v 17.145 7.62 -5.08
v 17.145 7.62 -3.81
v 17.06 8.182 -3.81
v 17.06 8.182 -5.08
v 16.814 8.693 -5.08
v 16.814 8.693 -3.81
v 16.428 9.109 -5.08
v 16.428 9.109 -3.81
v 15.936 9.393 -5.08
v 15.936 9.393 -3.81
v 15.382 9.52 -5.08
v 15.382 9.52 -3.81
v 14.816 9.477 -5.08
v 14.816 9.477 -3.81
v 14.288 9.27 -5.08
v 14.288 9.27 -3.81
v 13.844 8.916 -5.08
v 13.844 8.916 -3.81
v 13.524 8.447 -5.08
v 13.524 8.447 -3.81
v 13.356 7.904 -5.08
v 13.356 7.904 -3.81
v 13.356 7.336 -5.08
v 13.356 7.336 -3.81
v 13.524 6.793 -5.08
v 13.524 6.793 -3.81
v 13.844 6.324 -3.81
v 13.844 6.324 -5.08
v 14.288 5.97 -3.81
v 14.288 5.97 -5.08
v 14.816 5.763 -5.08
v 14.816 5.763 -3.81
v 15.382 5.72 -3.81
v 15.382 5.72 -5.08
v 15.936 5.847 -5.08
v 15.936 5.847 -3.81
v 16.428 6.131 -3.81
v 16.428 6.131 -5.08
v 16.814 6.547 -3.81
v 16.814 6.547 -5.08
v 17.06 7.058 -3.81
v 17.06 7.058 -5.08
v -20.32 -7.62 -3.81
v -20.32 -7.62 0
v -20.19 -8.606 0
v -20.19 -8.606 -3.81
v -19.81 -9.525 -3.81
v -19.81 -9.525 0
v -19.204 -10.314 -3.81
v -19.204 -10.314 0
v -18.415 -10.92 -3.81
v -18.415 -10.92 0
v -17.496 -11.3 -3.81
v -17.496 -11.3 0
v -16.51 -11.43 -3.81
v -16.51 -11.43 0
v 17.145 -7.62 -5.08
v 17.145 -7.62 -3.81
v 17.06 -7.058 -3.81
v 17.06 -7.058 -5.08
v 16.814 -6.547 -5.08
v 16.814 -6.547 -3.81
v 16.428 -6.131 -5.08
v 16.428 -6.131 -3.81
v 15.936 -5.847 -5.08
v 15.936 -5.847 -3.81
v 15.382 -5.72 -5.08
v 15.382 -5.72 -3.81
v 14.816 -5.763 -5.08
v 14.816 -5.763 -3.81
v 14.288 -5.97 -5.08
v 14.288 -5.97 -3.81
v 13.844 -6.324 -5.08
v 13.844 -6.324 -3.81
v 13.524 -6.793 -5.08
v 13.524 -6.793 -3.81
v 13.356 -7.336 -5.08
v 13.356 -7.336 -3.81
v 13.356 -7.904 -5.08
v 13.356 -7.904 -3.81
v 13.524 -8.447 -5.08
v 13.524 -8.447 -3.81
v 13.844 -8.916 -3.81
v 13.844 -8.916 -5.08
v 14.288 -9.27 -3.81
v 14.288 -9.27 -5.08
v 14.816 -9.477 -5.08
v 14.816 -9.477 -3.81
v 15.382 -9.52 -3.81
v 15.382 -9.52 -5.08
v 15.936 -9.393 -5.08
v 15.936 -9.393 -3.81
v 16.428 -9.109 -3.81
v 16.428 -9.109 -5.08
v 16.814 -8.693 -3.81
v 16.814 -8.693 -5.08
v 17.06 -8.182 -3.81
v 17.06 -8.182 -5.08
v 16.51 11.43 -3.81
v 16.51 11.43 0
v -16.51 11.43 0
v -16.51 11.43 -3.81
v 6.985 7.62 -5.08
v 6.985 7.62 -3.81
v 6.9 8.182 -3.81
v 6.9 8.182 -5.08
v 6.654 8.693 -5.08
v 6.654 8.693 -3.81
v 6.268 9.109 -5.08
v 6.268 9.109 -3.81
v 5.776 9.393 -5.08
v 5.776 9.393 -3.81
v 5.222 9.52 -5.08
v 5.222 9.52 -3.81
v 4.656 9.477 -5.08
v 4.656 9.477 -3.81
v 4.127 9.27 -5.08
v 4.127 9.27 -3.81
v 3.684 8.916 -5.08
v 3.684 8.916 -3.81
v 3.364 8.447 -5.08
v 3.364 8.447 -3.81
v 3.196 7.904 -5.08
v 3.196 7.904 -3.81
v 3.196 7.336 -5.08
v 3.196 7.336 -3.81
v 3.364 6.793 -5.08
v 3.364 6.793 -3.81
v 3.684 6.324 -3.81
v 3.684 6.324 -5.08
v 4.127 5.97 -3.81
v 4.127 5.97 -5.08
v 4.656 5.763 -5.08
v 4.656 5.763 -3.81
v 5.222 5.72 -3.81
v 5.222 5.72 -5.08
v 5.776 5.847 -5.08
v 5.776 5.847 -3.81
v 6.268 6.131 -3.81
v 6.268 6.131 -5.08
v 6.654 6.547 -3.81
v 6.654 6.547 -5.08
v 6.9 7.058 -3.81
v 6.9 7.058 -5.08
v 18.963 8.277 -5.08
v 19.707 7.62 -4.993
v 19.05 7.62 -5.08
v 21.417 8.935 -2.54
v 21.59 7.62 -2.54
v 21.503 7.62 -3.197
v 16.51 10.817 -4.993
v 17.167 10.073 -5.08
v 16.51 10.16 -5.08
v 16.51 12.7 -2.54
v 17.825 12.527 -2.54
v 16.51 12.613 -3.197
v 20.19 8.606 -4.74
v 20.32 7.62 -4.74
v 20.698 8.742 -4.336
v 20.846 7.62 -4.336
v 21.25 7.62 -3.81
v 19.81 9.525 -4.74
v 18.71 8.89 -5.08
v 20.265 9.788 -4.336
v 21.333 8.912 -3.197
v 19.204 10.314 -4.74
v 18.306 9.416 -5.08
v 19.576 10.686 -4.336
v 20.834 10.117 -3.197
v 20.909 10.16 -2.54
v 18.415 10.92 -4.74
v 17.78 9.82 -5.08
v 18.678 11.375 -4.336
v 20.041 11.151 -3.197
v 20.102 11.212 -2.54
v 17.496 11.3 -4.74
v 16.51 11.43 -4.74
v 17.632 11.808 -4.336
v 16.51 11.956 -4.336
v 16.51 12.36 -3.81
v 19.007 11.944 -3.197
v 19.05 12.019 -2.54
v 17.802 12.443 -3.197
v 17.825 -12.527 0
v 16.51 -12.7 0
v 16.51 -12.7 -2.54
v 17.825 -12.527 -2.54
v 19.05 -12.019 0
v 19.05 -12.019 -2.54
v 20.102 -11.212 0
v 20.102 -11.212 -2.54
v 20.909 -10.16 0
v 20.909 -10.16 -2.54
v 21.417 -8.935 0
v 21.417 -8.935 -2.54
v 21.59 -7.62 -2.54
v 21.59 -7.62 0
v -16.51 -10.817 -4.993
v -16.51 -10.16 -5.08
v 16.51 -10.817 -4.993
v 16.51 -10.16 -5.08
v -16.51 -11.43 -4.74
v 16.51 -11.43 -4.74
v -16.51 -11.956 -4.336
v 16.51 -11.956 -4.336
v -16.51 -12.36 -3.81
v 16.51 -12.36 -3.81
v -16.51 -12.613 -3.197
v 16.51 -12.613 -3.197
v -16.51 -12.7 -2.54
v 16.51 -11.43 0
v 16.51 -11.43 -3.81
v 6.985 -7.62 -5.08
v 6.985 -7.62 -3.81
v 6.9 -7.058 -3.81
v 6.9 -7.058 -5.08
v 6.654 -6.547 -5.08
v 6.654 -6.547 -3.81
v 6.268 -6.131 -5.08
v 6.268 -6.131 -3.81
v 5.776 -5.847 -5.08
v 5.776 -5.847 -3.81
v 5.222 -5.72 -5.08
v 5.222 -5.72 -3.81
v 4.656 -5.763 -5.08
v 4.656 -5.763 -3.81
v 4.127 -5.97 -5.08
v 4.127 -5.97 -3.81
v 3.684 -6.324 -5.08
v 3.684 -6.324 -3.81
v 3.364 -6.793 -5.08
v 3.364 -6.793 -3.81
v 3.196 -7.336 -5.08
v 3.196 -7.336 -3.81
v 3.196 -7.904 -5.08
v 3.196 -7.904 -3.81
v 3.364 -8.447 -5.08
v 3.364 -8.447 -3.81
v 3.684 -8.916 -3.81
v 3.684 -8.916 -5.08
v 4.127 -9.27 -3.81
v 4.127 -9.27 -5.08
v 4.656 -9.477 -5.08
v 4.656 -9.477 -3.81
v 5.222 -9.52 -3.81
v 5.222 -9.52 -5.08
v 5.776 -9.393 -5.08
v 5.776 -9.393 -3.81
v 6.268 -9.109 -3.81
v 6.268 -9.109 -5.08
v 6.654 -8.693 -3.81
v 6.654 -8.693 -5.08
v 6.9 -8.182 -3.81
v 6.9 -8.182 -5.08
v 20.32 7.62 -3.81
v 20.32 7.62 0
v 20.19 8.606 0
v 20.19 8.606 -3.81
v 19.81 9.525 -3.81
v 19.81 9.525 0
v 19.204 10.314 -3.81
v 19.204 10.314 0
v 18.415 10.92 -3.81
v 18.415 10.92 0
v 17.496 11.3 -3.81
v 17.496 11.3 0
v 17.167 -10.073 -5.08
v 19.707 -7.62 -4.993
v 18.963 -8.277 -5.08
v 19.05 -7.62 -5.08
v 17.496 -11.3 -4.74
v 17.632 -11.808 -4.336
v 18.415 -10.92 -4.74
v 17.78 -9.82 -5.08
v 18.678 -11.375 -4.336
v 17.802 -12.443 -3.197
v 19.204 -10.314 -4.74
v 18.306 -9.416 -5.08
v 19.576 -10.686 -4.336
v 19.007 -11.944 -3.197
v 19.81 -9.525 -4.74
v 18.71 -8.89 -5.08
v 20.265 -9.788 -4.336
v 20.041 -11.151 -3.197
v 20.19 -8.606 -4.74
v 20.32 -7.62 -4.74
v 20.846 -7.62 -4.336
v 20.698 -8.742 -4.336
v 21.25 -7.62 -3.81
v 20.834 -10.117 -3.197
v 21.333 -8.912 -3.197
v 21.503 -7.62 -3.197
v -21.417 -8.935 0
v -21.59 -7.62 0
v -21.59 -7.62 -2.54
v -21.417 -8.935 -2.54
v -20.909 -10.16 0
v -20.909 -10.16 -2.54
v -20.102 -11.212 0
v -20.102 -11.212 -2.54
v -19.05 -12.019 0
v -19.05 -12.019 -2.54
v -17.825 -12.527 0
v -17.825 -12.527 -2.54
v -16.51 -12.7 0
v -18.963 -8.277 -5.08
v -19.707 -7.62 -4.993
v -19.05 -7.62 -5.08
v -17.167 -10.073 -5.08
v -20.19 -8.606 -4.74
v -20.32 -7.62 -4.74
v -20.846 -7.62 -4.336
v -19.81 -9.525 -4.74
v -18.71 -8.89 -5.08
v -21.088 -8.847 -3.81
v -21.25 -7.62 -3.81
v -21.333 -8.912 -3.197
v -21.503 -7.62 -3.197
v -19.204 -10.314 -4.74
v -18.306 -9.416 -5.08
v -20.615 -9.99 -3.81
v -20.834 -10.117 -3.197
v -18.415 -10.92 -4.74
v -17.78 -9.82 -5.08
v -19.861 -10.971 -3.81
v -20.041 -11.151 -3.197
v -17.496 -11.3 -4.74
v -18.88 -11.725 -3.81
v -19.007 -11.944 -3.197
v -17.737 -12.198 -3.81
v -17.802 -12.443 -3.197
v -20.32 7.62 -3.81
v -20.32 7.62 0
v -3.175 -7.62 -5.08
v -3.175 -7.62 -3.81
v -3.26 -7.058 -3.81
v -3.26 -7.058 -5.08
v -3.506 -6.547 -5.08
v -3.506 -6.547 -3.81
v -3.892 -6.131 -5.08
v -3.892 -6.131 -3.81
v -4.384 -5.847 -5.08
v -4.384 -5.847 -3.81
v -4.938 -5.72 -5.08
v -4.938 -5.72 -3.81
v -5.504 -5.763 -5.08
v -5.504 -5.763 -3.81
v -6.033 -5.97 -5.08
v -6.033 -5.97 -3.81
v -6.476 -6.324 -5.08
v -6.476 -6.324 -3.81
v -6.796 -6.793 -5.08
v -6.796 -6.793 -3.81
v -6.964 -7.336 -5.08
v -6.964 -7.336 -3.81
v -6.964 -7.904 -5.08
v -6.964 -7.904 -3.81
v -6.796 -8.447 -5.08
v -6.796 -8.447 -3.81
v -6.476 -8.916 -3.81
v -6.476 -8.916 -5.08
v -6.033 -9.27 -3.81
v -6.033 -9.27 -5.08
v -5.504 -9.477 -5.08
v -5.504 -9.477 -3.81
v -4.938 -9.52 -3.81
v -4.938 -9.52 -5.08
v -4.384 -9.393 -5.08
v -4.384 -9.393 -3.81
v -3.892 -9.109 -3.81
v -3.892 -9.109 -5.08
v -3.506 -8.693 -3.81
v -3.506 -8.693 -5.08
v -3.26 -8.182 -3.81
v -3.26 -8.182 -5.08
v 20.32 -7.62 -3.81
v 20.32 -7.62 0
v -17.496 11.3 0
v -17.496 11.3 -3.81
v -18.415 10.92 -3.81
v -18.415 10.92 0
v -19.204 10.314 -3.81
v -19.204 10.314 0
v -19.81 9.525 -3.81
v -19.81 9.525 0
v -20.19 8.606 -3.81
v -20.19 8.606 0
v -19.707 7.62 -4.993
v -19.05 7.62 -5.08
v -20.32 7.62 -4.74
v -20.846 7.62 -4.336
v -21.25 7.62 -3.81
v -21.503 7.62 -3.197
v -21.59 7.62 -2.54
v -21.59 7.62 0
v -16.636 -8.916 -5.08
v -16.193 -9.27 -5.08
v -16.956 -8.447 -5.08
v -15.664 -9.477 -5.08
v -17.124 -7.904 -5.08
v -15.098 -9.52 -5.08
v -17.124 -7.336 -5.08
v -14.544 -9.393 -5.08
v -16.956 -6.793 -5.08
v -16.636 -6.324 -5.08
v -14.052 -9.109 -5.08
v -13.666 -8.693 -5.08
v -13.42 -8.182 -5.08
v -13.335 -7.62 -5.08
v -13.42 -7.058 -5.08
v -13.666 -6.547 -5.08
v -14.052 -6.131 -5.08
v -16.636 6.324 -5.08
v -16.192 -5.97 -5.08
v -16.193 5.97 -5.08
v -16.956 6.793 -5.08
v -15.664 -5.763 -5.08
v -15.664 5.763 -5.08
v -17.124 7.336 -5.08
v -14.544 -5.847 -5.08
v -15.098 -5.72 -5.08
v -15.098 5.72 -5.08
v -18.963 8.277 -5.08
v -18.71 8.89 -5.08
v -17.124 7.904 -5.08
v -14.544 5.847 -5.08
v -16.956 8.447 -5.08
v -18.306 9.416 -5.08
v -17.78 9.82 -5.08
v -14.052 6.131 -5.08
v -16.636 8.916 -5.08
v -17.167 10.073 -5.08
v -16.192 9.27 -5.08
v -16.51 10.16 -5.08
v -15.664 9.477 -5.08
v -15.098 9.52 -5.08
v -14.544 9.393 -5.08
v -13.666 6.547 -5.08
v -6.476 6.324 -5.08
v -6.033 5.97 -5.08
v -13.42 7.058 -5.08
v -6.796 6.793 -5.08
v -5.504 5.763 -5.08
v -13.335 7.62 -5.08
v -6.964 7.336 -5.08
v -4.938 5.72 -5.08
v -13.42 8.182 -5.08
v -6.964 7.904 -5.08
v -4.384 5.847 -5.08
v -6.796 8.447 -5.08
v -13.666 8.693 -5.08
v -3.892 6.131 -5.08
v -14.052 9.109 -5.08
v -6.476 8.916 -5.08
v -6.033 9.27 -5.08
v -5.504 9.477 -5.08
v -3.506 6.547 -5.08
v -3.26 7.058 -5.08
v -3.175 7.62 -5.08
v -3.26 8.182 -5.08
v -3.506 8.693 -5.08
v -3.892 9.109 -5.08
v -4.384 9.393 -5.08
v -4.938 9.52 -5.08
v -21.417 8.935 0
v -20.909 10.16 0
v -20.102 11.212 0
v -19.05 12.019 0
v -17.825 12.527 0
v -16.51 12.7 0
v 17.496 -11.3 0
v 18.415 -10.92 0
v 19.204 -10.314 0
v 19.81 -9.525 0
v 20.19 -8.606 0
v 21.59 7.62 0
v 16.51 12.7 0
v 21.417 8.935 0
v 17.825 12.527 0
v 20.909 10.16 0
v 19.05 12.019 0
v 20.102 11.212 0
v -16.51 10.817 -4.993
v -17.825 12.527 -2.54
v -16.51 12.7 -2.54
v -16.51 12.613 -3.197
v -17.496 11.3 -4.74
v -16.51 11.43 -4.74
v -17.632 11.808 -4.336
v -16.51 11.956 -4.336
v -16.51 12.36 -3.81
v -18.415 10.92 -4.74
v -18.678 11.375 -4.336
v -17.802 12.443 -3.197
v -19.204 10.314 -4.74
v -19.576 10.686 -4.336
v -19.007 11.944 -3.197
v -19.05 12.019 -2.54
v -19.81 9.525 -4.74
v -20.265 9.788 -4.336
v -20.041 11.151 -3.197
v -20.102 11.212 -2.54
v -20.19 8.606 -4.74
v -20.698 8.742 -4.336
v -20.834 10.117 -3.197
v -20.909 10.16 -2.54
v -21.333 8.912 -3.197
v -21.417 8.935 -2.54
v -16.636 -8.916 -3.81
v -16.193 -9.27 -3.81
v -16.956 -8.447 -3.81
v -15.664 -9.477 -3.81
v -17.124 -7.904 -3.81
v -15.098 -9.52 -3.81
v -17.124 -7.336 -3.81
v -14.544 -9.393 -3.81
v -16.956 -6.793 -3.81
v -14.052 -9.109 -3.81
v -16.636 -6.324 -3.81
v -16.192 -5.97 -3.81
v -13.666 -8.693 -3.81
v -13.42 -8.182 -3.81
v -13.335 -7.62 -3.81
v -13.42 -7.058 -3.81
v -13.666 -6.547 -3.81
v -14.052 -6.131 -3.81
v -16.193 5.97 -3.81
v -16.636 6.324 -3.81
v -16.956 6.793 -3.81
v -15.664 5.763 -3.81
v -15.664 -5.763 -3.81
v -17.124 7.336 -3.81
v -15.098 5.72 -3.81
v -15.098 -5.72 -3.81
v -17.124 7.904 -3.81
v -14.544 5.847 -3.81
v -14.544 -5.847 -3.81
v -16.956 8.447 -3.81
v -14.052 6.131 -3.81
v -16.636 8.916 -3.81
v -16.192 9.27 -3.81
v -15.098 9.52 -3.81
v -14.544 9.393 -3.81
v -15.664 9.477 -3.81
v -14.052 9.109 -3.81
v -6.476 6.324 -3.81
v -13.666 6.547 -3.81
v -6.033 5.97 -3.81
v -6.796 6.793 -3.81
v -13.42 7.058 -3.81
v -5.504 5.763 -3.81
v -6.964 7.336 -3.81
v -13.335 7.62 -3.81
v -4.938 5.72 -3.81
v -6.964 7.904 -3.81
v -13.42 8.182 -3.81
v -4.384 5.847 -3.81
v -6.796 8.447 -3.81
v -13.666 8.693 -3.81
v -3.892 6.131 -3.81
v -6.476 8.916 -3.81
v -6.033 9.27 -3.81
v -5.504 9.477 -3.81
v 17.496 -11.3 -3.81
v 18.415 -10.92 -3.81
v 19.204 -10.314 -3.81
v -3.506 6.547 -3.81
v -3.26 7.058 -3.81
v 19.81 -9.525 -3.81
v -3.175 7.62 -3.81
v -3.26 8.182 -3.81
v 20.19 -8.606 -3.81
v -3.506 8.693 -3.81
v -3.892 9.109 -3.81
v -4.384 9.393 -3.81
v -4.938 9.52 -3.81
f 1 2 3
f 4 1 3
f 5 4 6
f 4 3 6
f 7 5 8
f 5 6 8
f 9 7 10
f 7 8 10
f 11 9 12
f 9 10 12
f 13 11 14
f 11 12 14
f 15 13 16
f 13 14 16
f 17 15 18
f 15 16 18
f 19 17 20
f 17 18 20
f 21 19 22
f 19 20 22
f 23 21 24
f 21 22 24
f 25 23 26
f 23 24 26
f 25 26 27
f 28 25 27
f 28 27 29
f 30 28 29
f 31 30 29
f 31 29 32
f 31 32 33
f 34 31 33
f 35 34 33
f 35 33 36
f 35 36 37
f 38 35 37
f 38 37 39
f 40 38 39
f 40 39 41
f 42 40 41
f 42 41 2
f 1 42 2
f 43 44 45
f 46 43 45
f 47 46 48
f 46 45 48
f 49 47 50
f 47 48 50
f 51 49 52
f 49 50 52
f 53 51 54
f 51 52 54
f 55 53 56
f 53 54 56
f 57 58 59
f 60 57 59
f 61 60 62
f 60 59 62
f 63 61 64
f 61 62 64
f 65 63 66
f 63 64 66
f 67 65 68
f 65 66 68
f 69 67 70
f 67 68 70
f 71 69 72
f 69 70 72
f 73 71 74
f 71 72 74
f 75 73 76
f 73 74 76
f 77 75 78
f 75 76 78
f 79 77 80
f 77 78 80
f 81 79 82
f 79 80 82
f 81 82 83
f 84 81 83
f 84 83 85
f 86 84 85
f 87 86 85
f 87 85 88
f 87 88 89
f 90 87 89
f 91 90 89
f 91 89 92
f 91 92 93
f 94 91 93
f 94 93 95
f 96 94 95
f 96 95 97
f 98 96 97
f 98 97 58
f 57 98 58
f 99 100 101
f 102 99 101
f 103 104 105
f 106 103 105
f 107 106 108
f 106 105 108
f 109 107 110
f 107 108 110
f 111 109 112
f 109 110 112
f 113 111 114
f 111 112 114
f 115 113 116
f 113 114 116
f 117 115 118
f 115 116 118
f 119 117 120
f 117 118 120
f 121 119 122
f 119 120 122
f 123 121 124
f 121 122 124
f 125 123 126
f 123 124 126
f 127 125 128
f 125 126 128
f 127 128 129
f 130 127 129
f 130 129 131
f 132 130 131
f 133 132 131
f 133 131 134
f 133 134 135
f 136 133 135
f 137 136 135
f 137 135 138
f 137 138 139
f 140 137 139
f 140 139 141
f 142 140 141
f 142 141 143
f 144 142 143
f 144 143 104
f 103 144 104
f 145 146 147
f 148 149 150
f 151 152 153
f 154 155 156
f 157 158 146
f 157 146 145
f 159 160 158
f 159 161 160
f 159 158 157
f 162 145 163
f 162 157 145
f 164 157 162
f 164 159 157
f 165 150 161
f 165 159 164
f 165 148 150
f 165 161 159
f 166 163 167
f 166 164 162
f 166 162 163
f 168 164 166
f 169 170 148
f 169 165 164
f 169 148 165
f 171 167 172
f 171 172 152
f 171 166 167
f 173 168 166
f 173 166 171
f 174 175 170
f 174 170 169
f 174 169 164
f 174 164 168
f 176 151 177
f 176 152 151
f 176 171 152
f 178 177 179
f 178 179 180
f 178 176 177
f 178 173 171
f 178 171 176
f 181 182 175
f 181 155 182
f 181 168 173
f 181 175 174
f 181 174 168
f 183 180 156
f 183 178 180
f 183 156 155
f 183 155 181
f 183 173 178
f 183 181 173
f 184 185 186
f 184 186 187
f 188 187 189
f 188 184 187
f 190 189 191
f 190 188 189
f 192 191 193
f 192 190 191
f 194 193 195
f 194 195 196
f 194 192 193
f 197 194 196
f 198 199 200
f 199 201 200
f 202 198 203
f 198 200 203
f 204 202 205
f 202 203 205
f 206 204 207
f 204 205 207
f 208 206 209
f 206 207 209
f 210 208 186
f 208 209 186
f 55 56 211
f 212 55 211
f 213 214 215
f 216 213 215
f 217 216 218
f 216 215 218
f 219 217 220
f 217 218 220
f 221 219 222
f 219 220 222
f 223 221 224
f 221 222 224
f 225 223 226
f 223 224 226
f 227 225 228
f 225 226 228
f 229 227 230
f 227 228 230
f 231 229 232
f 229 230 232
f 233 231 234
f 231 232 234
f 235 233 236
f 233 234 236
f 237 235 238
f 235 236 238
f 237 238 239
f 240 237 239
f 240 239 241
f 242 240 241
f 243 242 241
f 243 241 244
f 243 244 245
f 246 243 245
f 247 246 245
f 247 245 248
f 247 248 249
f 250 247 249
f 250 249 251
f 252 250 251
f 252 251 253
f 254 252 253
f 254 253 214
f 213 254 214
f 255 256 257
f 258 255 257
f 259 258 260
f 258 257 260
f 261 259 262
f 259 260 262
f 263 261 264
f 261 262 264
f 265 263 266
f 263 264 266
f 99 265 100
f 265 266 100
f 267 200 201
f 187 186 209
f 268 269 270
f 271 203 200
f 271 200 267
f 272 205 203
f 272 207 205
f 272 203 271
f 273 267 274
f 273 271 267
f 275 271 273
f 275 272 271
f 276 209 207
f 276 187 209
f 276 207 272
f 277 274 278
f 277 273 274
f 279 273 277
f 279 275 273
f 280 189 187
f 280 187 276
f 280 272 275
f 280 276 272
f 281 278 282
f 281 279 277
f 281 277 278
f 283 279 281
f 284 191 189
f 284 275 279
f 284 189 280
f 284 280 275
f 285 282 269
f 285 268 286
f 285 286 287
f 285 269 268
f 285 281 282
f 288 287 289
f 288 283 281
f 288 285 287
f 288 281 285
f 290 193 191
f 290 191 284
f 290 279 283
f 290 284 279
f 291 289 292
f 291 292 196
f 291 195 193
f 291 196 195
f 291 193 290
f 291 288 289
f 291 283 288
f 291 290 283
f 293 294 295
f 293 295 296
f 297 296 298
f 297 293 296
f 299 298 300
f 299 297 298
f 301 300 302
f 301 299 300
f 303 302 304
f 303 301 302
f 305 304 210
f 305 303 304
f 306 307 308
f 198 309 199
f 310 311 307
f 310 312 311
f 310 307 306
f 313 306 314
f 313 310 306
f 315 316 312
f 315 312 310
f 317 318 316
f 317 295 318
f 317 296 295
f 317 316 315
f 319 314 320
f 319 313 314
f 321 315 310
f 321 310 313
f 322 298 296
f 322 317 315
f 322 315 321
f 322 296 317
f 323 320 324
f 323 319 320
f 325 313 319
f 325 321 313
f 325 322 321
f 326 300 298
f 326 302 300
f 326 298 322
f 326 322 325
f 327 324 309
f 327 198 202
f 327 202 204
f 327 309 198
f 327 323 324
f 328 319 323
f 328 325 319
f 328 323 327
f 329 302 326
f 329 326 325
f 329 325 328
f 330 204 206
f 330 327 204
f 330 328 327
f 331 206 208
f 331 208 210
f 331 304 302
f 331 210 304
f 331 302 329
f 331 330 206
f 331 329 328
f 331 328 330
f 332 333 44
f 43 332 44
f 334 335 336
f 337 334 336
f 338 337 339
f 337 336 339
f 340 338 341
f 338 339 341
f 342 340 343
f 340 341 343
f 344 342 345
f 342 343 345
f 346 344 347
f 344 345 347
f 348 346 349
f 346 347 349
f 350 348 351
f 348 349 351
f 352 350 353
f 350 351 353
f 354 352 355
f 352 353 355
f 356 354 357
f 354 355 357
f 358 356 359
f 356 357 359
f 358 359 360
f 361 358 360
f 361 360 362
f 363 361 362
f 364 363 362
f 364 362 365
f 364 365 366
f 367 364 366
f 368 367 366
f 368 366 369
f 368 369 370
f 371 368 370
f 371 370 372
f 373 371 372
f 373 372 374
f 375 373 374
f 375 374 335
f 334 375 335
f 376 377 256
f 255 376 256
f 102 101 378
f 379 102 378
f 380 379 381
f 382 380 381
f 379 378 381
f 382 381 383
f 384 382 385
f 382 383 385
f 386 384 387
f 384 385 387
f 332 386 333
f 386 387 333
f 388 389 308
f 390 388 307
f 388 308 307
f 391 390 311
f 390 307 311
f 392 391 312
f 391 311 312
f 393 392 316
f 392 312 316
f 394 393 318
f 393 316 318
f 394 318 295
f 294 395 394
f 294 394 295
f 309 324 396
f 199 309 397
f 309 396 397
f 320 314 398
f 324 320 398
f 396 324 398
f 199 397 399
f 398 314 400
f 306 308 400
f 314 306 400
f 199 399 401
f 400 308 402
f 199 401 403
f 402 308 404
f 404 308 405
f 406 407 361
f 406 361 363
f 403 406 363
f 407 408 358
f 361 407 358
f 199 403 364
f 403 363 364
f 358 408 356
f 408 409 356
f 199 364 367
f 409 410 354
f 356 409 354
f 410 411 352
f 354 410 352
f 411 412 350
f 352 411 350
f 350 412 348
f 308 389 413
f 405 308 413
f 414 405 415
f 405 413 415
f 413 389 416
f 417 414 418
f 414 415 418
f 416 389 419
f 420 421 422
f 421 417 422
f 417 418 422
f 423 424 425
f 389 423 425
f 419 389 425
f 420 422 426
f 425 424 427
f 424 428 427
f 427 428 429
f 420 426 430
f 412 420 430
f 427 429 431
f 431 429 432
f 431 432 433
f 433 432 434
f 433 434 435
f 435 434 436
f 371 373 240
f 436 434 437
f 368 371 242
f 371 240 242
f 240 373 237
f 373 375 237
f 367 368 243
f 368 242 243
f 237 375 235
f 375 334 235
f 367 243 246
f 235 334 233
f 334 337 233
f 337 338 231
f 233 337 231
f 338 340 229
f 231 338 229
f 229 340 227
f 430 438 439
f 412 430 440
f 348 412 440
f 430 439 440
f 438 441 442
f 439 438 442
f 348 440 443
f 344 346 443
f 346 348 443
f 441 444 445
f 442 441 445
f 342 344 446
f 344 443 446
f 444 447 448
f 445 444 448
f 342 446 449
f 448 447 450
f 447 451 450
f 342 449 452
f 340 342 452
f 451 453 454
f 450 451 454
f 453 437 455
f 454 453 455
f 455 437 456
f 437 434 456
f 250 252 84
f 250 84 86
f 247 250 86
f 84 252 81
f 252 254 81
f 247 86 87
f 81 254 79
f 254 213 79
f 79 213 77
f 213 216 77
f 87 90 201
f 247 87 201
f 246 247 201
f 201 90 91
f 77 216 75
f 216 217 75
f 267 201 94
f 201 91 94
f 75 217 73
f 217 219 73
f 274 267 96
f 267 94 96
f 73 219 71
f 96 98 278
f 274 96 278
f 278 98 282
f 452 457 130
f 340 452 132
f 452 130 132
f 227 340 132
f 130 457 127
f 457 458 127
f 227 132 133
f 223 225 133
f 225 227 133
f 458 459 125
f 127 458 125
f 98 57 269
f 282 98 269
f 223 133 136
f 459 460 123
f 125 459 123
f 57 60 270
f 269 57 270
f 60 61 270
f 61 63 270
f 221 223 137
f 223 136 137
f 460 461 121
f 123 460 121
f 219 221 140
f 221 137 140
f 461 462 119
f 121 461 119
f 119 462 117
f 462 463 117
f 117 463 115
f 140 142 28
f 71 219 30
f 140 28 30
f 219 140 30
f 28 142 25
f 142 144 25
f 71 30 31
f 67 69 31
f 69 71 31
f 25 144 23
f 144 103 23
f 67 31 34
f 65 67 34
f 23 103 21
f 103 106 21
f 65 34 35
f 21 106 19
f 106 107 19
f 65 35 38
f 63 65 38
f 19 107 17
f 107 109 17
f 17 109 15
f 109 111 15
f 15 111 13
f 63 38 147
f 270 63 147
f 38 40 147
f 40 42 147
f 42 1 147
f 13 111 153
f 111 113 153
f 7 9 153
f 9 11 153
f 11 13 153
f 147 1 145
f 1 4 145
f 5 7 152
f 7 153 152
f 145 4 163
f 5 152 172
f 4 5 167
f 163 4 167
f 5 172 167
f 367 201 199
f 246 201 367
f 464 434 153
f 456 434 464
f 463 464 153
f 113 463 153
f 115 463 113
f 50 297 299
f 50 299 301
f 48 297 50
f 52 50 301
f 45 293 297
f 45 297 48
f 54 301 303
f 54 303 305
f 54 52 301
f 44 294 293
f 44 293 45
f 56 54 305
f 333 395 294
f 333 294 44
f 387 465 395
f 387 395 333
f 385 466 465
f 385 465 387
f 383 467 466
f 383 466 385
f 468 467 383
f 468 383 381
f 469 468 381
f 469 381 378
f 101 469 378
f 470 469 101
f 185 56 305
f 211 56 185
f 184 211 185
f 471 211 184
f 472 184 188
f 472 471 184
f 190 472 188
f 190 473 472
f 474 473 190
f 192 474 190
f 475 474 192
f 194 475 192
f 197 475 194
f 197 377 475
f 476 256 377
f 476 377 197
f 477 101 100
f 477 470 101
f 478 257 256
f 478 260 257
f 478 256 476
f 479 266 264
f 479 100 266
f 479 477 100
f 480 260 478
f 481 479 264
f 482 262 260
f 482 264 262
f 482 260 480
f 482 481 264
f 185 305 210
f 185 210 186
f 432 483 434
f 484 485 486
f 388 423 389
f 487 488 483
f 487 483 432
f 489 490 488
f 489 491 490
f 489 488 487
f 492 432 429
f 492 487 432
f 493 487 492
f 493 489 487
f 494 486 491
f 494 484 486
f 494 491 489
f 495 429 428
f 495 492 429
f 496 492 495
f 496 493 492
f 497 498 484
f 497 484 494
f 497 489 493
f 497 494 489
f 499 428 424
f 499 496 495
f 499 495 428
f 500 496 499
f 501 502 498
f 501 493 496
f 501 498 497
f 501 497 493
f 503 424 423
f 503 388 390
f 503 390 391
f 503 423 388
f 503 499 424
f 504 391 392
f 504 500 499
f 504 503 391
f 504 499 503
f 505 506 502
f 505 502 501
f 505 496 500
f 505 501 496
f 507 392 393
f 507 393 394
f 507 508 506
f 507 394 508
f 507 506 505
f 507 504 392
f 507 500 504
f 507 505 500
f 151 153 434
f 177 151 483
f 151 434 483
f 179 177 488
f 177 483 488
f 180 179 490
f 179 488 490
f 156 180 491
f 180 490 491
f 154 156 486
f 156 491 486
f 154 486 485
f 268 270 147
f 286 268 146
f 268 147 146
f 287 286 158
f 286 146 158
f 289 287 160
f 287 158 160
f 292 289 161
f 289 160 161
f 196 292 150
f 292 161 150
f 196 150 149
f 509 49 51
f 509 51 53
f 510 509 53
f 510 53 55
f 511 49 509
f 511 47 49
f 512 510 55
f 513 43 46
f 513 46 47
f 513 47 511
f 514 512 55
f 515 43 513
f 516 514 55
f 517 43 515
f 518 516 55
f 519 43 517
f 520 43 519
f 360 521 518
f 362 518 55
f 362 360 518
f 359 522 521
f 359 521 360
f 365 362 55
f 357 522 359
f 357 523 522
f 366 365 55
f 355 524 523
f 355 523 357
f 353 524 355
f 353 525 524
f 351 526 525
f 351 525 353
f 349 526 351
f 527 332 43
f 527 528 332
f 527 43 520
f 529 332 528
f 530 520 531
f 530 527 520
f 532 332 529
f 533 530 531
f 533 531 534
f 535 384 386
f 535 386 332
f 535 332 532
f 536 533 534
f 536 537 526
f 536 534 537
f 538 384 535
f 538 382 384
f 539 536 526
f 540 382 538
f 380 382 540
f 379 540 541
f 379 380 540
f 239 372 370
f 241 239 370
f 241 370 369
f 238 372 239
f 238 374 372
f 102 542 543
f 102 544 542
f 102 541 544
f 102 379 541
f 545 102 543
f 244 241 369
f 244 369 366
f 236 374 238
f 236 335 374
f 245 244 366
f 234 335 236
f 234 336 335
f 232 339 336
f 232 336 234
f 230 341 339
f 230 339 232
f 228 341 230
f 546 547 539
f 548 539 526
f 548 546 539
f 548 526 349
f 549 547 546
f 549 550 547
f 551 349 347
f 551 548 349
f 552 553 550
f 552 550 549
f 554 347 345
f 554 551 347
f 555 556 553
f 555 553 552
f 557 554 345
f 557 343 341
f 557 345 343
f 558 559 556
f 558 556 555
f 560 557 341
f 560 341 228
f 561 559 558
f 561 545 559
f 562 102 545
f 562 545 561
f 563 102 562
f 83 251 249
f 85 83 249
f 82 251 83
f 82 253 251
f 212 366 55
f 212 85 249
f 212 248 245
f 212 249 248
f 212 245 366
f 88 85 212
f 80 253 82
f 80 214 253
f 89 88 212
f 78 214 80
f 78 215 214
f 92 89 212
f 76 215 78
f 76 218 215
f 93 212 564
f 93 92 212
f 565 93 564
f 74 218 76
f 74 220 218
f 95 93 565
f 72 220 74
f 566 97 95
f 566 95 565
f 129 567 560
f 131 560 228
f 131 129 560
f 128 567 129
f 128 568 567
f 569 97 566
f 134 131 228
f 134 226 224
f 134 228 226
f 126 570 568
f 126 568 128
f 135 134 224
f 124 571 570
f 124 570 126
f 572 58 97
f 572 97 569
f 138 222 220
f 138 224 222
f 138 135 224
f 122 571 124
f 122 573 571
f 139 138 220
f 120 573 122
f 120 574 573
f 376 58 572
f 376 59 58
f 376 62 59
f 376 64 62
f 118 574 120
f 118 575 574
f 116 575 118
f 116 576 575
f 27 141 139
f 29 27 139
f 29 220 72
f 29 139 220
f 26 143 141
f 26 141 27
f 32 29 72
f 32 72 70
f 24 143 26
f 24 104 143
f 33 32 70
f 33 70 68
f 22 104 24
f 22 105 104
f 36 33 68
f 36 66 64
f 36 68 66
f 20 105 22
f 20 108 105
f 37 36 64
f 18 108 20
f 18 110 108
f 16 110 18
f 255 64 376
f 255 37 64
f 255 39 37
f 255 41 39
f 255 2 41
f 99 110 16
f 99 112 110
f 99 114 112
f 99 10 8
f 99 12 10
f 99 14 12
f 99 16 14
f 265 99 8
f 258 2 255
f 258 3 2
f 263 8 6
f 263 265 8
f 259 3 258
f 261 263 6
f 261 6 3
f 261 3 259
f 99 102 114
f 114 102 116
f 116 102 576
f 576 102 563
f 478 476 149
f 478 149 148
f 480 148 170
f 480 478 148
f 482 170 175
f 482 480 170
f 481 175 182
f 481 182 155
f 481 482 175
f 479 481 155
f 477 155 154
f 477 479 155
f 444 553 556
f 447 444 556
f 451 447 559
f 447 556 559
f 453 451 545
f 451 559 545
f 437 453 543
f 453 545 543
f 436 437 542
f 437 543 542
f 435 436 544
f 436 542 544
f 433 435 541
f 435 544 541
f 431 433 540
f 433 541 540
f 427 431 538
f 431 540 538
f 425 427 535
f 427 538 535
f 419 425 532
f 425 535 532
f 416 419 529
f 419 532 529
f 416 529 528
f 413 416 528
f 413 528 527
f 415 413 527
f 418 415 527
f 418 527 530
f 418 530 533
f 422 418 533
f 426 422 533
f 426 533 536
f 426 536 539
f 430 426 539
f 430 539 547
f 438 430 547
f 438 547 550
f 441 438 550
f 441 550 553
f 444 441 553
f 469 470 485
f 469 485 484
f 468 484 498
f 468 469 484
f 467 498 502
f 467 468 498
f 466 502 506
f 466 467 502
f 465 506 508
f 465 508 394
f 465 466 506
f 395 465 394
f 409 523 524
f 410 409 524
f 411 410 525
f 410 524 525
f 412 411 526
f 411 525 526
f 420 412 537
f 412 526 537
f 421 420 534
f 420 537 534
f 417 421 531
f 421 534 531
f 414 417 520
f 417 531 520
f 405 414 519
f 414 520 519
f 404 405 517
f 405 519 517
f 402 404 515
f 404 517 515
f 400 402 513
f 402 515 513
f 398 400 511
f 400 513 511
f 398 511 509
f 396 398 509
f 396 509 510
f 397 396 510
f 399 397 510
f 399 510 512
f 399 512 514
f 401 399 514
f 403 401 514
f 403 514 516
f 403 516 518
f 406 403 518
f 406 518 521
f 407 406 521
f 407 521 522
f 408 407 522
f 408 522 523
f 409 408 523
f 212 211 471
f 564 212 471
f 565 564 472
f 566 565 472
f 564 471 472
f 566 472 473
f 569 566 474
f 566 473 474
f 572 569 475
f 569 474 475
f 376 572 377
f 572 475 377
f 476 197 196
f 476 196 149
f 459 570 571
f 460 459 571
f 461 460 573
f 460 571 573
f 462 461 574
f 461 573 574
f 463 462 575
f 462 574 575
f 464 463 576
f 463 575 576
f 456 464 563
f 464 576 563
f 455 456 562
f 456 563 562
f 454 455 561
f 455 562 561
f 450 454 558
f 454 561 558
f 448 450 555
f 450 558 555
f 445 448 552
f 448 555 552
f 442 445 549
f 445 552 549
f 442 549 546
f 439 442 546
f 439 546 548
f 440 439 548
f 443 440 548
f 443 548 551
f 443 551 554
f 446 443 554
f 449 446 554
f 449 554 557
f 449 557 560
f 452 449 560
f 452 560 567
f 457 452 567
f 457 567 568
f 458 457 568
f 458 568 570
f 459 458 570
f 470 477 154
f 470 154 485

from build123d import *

# Parameters (mm, degrees)
F4_DEPTH = 5.08
F5_T     = -1.27
F3_R     = 1.524
F6_DEPTH = 25.4
F7_R     = 1.905
F8_DEPTH = 9.906
F9_R     = 2.54


with BuildPart() as f4:
    # F1 (on Top) → F4 (new body)
    with BuildSketch(Plane.XY):
        with BuildLine():
            ThreePointArc((21.59, 7.62), (20.102102, 11.212102), (16.51, 12.7))
            Line((16.51, 12.7), (-16.51, 12.7))
            ThreePointArc((-16.51, 12.7), (-20.102102, 11.212102), (-21.59, 7.62))
            Line((-21.59, 7.62), (-21.59, -7.62))
            ThreePointArc((-21.59, -7.62), (-20.102102, -11.212102), (-16.51, -12.7))
            Line((-16.51, -12.7), (16.51, -12.7))
            ThreePointArc((16.51, -12.7), (20.102102, -11.212102), (21.59, -7.62))
            Line((21.59, -7.62), (21.59, 7.62))
        make_face()
    extrude(amount=-F4_DEPTH)

    # F5
    f5_openings = [f4.faces().sort_by_distance(p)[0] for p in [
        (0, 0, 0),
    ]]
    offset(amount=F5_T, openings=f5_openings)

    # F3 (on offset) → F6 (cut)
    with BuildSketch(Plane.XY.offset(-7.62)):
        with Locations((15.24, -7.62)):
            Circle(F3_R)
        with Locations((15.24, 7.62)):
            Circle(F3_R)
        with Locations((5.08, -7.62)):
            Circle(F3_R)
        with Locations((-5.08, -7.62)):
            Circle(F3_R)
        with Locations((-15.24, -7.62)):
            Circle(F3_R)
        with Locations((5.08, 7.62)):
            Circle(F3_R)
        with Locations((-5.08, 7.62)):
            Circle(F3_R)
        with Locations((-15.24, 7.62)):
            Circle(F3_R)
    extrude(amount=-F6_DEPTH, mode=Mode.SUBTRACT)

    # F7 (on face) → F8 (cut)
    with BuildSketch(Plane.XY):
        with Locations((15.24, -7.62)):
            Circle(F7_R)
        with Locations((5.08, -7.62)):
            Circle(F7_R)
        with Locations((-5.08, -7.62)):
            Circle(F7_R)
        with Locations((-15.24, -7.62)):
            Circle(F7_R)
        with Locations((15.24, 7.62)):
            Circle(F7_R)
        with Locations((5.08, 7.62)):
            Circle(F7_R)
        with Locations((-5.08, 7.62)):
            Circle(F7_R)
        with Locations((-15.24, 7.62)):
            Circle(F7_R)
    extrude(amount=-F8_DEPTH, mode=Mode.SUBTRACT)

    # F9
    f9_edges = [f4.edges().sort_by_distance(p)[0] for p in [
        (0, -12.7, -5.08),
    ]]
    fillet(f9_edges, radius=F9_R)


solid = f4.part
